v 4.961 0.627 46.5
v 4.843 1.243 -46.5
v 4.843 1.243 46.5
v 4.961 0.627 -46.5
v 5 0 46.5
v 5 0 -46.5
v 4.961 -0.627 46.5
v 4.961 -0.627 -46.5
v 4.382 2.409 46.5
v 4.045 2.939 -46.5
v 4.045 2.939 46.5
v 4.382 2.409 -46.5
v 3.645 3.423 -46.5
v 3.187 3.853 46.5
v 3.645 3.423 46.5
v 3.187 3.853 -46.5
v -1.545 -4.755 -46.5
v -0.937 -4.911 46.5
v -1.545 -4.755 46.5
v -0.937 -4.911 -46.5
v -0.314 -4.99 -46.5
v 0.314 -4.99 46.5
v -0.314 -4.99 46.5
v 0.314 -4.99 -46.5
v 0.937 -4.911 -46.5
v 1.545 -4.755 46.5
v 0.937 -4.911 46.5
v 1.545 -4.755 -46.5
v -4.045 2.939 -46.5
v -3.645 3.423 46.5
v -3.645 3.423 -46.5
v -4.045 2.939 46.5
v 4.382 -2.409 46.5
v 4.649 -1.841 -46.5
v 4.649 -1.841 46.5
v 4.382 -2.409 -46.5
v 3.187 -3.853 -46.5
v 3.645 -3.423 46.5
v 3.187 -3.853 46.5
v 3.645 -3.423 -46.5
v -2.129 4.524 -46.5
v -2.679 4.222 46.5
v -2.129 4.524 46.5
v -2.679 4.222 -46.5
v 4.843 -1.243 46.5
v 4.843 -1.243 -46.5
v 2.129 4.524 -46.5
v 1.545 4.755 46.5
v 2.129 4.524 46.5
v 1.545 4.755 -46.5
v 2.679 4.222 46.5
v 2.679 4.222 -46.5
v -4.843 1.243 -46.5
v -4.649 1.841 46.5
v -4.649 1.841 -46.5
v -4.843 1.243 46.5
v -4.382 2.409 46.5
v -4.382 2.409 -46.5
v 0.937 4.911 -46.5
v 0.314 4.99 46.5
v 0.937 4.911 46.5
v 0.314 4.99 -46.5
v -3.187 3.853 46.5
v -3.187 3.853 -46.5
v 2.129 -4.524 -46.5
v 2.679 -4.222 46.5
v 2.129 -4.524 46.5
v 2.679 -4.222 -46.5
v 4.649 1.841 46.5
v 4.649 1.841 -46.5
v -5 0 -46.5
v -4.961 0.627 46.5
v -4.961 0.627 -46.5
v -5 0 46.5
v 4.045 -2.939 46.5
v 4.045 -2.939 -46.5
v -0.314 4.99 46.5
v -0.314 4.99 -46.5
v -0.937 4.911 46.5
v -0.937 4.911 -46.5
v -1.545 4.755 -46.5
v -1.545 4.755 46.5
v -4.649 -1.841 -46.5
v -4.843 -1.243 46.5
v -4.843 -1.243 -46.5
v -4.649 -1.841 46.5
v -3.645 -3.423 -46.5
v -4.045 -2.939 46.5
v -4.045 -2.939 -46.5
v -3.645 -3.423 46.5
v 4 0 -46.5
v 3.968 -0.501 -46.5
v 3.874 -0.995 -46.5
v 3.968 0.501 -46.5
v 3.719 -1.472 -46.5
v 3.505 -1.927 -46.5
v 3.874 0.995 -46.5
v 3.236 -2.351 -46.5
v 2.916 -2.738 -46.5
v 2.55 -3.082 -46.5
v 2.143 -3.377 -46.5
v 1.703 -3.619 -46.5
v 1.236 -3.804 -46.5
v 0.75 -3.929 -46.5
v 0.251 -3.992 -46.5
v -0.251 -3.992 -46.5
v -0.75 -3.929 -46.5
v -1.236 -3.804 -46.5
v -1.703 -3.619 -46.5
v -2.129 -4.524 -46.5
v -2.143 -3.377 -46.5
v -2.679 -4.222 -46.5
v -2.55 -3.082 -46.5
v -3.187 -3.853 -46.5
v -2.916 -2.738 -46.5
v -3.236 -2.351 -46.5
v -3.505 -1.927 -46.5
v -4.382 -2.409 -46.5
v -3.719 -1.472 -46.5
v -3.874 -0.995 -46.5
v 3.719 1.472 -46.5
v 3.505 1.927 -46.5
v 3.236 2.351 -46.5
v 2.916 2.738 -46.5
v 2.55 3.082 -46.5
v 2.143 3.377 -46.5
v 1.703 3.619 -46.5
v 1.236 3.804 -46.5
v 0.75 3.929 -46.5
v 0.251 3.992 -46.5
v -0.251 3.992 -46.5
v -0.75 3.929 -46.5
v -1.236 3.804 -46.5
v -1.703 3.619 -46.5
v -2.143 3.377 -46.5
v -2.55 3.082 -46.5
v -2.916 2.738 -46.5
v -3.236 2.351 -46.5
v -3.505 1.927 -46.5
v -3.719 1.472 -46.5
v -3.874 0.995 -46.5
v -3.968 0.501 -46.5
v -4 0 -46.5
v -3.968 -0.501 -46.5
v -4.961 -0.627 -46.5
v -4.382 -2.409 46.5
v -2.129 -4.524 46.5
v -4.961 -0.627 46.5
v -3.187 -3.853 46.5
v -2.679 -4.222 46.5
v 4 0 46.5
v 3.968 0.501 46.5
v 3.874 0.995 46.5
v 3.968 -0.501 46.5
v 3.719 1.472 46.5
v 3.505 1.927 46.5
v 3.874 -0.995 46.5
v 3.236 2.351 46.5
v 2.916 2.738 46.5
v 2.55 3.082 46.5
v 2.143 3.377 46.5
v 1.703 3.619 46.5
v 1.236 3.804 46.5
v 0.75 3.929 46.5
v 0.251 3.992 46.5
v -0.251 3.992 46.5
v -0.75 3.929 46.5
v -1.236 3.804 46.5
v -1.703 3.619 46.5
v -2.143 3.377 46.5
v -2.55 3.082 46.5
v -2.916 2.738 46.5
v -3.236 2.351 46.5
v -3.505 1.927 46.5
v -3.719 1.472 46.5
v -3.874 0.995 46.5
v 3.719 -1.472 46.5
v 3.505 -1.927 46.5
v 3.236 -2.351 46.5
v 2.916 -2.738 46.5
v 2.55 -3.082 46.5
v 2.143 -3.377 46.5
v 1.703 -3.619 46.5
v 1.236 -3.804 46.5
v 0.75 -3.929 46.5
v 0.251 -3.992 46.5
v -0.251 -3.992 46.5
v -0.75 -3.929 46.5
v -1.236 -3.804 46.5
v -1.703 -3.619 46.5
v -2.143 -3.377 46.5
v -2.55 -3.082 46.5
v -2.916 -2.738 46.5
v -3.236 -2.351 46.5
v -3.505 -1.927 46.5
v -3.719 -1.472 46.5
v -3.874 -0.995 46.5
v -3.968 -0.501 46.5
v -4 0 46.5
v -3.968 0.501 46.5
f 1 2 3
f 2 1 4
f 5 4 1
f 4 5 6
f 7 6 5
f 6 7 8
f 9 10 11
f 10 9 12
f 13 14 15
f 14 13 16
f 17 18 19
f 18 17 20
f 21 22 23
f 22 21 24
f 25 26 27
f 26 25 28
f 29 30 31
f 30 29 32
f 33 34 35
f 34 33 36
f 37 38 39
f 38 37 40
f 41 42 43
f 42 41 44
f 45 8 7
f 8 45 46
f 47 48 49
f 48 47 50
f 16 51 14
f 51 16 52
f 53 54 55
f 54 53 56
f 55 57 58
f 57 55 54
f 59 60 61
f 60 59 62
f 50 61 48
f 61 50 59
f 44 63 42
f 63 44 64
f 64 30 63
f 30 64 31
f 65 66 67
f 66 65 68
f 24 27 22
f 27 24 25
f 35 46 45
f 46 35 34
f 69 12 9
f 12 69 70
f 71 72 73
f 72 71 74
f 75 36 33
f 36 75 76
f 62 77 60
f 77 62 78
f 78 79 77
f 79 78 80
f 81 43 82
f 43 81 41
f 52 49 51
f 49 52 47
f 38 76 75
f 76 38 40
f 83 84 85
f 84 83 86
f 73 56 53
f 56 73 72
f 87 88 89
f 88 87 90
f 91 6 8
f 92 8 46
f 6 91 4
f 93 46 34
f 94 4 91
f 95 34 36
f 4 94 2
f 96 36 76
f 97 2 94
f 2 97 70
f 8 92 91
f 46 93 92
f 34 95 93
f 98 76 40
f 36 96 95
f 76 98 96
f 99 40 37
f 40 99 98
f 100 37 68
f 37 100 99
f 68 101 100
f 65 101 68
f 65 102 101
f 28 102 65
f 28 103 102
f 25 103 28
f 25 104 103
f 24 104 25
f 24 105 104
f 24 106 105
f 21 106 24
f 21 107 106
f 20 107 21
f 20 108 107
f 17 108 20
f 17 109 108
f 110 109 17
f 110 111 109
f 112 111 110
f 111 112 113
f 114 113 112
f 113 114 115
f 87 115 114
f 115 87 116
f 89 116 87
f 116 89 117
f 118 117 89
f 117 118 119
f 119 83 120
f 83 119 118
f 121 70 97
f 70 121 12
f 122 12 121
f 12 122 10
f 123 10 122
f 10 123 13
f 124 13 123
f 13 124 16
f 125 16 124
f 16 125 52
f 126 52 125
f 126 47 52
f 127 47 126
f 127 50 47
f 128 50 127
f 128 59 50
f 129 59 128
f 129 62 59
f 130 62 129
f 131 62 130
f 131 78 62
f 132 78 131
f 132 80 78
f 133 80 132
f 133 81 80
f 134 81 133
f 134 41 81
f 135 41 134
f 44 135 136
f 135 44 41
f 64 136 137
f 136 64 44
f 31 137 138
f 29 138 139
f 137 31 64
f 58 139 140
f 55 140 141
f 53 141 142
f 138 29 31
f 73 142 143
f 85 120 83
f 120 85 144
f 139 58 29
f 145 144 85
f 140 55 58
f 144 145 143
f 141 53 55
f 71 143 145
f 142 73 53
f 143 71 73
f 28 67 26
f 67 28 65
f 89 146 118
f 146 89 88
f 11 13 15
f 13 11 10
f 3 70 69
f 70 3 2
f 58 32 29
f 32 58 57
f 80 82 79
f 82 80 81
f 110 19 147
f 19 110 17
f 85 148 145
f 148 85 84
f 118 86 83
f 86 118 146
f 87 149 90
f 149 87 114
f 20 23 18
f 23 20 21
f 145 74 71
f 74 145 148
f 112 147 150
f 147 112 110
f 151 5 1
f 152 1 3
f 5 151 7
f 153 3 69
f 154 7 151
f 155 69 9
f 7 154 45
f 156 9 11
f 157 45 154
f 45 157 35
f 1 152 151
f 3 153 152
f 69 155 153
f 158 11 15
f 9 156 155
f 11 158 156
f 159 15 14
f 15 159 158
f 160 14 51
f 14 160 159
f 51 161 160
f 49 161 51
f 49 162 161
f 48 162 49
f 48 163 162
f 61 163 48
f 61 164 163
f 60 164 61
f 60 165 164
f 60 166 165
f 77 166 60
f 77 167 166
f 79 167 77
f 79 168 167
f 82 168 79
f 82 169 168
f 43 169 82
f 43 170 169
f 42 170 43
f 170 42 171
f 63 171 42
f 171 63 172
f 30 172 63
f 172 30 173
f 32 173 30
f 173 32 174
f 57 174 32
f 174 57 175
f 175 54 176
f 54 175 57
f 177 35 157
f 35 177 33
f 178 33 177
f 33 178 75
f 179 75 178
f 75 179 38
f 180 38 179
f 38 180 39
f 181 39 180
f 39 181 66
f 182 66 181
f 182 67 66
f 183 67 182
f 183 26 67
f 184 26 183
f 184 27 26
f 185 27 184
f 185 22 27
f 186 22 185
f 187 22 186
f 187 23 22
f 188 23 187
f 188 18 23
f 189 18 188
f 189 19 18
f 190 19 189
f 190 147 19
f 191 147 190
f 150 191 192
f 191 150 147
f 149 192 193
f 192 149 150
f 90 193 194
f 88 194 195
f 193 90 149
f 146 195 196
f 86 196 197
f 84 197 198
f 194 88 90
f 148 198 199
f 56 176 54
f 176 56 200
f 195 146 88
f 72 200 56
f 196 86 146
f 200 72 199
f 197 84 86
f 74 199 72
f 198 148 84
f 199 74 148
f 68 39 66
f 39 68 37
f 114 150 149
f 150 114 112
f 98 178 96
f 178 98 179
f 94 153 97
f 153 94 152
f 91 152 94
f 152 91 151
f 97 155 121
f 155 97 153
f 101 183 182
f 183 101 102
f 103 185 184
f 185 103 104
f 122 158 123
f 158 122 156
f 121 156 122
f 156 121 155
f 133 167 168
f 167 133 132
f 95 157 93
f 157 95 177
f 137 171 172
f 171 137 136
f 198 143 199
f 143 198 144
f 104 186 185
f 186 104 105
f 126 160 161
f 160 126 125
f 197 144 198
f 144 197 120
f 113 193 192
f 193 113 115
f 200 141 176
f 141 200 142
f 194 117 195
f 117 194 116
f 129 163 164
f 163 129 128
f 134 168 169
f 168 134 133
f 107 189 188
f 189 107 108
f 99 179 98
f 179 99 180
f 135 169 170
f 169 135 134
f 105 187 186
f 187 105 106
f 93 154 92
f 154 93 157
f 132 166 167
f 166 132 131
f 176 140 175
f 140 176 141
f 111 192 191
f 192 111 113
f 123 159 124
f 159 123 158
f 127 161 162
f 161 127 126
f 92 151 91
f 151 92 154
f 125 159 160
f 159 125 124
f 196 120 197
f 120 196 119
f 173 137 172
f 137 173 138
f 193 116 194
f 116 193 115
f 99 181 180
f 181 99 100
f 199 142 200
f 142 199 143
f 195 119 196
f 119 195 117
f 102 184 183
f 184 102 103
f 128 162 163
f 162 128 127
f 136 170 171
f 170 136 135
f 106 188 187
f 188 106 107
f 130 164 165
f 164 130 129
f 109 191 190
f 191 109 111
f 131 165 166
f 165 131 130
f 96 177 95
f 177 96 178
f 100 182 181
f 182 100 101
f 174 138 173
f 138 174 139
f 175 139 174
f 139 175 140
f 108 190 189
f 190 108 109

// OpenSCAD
$fn = 50;


difference() {
	union() {
		translate(v = [0, 0, -46.5000000000]) {
			cylinder(h = 93, r = 5.0000000000);
		}
	}
	union() {
		translate(v = [0, 0, -100.0000000000]) {
			cylinder(h = 200, r = 4.0000000000);
		}
	}
}
